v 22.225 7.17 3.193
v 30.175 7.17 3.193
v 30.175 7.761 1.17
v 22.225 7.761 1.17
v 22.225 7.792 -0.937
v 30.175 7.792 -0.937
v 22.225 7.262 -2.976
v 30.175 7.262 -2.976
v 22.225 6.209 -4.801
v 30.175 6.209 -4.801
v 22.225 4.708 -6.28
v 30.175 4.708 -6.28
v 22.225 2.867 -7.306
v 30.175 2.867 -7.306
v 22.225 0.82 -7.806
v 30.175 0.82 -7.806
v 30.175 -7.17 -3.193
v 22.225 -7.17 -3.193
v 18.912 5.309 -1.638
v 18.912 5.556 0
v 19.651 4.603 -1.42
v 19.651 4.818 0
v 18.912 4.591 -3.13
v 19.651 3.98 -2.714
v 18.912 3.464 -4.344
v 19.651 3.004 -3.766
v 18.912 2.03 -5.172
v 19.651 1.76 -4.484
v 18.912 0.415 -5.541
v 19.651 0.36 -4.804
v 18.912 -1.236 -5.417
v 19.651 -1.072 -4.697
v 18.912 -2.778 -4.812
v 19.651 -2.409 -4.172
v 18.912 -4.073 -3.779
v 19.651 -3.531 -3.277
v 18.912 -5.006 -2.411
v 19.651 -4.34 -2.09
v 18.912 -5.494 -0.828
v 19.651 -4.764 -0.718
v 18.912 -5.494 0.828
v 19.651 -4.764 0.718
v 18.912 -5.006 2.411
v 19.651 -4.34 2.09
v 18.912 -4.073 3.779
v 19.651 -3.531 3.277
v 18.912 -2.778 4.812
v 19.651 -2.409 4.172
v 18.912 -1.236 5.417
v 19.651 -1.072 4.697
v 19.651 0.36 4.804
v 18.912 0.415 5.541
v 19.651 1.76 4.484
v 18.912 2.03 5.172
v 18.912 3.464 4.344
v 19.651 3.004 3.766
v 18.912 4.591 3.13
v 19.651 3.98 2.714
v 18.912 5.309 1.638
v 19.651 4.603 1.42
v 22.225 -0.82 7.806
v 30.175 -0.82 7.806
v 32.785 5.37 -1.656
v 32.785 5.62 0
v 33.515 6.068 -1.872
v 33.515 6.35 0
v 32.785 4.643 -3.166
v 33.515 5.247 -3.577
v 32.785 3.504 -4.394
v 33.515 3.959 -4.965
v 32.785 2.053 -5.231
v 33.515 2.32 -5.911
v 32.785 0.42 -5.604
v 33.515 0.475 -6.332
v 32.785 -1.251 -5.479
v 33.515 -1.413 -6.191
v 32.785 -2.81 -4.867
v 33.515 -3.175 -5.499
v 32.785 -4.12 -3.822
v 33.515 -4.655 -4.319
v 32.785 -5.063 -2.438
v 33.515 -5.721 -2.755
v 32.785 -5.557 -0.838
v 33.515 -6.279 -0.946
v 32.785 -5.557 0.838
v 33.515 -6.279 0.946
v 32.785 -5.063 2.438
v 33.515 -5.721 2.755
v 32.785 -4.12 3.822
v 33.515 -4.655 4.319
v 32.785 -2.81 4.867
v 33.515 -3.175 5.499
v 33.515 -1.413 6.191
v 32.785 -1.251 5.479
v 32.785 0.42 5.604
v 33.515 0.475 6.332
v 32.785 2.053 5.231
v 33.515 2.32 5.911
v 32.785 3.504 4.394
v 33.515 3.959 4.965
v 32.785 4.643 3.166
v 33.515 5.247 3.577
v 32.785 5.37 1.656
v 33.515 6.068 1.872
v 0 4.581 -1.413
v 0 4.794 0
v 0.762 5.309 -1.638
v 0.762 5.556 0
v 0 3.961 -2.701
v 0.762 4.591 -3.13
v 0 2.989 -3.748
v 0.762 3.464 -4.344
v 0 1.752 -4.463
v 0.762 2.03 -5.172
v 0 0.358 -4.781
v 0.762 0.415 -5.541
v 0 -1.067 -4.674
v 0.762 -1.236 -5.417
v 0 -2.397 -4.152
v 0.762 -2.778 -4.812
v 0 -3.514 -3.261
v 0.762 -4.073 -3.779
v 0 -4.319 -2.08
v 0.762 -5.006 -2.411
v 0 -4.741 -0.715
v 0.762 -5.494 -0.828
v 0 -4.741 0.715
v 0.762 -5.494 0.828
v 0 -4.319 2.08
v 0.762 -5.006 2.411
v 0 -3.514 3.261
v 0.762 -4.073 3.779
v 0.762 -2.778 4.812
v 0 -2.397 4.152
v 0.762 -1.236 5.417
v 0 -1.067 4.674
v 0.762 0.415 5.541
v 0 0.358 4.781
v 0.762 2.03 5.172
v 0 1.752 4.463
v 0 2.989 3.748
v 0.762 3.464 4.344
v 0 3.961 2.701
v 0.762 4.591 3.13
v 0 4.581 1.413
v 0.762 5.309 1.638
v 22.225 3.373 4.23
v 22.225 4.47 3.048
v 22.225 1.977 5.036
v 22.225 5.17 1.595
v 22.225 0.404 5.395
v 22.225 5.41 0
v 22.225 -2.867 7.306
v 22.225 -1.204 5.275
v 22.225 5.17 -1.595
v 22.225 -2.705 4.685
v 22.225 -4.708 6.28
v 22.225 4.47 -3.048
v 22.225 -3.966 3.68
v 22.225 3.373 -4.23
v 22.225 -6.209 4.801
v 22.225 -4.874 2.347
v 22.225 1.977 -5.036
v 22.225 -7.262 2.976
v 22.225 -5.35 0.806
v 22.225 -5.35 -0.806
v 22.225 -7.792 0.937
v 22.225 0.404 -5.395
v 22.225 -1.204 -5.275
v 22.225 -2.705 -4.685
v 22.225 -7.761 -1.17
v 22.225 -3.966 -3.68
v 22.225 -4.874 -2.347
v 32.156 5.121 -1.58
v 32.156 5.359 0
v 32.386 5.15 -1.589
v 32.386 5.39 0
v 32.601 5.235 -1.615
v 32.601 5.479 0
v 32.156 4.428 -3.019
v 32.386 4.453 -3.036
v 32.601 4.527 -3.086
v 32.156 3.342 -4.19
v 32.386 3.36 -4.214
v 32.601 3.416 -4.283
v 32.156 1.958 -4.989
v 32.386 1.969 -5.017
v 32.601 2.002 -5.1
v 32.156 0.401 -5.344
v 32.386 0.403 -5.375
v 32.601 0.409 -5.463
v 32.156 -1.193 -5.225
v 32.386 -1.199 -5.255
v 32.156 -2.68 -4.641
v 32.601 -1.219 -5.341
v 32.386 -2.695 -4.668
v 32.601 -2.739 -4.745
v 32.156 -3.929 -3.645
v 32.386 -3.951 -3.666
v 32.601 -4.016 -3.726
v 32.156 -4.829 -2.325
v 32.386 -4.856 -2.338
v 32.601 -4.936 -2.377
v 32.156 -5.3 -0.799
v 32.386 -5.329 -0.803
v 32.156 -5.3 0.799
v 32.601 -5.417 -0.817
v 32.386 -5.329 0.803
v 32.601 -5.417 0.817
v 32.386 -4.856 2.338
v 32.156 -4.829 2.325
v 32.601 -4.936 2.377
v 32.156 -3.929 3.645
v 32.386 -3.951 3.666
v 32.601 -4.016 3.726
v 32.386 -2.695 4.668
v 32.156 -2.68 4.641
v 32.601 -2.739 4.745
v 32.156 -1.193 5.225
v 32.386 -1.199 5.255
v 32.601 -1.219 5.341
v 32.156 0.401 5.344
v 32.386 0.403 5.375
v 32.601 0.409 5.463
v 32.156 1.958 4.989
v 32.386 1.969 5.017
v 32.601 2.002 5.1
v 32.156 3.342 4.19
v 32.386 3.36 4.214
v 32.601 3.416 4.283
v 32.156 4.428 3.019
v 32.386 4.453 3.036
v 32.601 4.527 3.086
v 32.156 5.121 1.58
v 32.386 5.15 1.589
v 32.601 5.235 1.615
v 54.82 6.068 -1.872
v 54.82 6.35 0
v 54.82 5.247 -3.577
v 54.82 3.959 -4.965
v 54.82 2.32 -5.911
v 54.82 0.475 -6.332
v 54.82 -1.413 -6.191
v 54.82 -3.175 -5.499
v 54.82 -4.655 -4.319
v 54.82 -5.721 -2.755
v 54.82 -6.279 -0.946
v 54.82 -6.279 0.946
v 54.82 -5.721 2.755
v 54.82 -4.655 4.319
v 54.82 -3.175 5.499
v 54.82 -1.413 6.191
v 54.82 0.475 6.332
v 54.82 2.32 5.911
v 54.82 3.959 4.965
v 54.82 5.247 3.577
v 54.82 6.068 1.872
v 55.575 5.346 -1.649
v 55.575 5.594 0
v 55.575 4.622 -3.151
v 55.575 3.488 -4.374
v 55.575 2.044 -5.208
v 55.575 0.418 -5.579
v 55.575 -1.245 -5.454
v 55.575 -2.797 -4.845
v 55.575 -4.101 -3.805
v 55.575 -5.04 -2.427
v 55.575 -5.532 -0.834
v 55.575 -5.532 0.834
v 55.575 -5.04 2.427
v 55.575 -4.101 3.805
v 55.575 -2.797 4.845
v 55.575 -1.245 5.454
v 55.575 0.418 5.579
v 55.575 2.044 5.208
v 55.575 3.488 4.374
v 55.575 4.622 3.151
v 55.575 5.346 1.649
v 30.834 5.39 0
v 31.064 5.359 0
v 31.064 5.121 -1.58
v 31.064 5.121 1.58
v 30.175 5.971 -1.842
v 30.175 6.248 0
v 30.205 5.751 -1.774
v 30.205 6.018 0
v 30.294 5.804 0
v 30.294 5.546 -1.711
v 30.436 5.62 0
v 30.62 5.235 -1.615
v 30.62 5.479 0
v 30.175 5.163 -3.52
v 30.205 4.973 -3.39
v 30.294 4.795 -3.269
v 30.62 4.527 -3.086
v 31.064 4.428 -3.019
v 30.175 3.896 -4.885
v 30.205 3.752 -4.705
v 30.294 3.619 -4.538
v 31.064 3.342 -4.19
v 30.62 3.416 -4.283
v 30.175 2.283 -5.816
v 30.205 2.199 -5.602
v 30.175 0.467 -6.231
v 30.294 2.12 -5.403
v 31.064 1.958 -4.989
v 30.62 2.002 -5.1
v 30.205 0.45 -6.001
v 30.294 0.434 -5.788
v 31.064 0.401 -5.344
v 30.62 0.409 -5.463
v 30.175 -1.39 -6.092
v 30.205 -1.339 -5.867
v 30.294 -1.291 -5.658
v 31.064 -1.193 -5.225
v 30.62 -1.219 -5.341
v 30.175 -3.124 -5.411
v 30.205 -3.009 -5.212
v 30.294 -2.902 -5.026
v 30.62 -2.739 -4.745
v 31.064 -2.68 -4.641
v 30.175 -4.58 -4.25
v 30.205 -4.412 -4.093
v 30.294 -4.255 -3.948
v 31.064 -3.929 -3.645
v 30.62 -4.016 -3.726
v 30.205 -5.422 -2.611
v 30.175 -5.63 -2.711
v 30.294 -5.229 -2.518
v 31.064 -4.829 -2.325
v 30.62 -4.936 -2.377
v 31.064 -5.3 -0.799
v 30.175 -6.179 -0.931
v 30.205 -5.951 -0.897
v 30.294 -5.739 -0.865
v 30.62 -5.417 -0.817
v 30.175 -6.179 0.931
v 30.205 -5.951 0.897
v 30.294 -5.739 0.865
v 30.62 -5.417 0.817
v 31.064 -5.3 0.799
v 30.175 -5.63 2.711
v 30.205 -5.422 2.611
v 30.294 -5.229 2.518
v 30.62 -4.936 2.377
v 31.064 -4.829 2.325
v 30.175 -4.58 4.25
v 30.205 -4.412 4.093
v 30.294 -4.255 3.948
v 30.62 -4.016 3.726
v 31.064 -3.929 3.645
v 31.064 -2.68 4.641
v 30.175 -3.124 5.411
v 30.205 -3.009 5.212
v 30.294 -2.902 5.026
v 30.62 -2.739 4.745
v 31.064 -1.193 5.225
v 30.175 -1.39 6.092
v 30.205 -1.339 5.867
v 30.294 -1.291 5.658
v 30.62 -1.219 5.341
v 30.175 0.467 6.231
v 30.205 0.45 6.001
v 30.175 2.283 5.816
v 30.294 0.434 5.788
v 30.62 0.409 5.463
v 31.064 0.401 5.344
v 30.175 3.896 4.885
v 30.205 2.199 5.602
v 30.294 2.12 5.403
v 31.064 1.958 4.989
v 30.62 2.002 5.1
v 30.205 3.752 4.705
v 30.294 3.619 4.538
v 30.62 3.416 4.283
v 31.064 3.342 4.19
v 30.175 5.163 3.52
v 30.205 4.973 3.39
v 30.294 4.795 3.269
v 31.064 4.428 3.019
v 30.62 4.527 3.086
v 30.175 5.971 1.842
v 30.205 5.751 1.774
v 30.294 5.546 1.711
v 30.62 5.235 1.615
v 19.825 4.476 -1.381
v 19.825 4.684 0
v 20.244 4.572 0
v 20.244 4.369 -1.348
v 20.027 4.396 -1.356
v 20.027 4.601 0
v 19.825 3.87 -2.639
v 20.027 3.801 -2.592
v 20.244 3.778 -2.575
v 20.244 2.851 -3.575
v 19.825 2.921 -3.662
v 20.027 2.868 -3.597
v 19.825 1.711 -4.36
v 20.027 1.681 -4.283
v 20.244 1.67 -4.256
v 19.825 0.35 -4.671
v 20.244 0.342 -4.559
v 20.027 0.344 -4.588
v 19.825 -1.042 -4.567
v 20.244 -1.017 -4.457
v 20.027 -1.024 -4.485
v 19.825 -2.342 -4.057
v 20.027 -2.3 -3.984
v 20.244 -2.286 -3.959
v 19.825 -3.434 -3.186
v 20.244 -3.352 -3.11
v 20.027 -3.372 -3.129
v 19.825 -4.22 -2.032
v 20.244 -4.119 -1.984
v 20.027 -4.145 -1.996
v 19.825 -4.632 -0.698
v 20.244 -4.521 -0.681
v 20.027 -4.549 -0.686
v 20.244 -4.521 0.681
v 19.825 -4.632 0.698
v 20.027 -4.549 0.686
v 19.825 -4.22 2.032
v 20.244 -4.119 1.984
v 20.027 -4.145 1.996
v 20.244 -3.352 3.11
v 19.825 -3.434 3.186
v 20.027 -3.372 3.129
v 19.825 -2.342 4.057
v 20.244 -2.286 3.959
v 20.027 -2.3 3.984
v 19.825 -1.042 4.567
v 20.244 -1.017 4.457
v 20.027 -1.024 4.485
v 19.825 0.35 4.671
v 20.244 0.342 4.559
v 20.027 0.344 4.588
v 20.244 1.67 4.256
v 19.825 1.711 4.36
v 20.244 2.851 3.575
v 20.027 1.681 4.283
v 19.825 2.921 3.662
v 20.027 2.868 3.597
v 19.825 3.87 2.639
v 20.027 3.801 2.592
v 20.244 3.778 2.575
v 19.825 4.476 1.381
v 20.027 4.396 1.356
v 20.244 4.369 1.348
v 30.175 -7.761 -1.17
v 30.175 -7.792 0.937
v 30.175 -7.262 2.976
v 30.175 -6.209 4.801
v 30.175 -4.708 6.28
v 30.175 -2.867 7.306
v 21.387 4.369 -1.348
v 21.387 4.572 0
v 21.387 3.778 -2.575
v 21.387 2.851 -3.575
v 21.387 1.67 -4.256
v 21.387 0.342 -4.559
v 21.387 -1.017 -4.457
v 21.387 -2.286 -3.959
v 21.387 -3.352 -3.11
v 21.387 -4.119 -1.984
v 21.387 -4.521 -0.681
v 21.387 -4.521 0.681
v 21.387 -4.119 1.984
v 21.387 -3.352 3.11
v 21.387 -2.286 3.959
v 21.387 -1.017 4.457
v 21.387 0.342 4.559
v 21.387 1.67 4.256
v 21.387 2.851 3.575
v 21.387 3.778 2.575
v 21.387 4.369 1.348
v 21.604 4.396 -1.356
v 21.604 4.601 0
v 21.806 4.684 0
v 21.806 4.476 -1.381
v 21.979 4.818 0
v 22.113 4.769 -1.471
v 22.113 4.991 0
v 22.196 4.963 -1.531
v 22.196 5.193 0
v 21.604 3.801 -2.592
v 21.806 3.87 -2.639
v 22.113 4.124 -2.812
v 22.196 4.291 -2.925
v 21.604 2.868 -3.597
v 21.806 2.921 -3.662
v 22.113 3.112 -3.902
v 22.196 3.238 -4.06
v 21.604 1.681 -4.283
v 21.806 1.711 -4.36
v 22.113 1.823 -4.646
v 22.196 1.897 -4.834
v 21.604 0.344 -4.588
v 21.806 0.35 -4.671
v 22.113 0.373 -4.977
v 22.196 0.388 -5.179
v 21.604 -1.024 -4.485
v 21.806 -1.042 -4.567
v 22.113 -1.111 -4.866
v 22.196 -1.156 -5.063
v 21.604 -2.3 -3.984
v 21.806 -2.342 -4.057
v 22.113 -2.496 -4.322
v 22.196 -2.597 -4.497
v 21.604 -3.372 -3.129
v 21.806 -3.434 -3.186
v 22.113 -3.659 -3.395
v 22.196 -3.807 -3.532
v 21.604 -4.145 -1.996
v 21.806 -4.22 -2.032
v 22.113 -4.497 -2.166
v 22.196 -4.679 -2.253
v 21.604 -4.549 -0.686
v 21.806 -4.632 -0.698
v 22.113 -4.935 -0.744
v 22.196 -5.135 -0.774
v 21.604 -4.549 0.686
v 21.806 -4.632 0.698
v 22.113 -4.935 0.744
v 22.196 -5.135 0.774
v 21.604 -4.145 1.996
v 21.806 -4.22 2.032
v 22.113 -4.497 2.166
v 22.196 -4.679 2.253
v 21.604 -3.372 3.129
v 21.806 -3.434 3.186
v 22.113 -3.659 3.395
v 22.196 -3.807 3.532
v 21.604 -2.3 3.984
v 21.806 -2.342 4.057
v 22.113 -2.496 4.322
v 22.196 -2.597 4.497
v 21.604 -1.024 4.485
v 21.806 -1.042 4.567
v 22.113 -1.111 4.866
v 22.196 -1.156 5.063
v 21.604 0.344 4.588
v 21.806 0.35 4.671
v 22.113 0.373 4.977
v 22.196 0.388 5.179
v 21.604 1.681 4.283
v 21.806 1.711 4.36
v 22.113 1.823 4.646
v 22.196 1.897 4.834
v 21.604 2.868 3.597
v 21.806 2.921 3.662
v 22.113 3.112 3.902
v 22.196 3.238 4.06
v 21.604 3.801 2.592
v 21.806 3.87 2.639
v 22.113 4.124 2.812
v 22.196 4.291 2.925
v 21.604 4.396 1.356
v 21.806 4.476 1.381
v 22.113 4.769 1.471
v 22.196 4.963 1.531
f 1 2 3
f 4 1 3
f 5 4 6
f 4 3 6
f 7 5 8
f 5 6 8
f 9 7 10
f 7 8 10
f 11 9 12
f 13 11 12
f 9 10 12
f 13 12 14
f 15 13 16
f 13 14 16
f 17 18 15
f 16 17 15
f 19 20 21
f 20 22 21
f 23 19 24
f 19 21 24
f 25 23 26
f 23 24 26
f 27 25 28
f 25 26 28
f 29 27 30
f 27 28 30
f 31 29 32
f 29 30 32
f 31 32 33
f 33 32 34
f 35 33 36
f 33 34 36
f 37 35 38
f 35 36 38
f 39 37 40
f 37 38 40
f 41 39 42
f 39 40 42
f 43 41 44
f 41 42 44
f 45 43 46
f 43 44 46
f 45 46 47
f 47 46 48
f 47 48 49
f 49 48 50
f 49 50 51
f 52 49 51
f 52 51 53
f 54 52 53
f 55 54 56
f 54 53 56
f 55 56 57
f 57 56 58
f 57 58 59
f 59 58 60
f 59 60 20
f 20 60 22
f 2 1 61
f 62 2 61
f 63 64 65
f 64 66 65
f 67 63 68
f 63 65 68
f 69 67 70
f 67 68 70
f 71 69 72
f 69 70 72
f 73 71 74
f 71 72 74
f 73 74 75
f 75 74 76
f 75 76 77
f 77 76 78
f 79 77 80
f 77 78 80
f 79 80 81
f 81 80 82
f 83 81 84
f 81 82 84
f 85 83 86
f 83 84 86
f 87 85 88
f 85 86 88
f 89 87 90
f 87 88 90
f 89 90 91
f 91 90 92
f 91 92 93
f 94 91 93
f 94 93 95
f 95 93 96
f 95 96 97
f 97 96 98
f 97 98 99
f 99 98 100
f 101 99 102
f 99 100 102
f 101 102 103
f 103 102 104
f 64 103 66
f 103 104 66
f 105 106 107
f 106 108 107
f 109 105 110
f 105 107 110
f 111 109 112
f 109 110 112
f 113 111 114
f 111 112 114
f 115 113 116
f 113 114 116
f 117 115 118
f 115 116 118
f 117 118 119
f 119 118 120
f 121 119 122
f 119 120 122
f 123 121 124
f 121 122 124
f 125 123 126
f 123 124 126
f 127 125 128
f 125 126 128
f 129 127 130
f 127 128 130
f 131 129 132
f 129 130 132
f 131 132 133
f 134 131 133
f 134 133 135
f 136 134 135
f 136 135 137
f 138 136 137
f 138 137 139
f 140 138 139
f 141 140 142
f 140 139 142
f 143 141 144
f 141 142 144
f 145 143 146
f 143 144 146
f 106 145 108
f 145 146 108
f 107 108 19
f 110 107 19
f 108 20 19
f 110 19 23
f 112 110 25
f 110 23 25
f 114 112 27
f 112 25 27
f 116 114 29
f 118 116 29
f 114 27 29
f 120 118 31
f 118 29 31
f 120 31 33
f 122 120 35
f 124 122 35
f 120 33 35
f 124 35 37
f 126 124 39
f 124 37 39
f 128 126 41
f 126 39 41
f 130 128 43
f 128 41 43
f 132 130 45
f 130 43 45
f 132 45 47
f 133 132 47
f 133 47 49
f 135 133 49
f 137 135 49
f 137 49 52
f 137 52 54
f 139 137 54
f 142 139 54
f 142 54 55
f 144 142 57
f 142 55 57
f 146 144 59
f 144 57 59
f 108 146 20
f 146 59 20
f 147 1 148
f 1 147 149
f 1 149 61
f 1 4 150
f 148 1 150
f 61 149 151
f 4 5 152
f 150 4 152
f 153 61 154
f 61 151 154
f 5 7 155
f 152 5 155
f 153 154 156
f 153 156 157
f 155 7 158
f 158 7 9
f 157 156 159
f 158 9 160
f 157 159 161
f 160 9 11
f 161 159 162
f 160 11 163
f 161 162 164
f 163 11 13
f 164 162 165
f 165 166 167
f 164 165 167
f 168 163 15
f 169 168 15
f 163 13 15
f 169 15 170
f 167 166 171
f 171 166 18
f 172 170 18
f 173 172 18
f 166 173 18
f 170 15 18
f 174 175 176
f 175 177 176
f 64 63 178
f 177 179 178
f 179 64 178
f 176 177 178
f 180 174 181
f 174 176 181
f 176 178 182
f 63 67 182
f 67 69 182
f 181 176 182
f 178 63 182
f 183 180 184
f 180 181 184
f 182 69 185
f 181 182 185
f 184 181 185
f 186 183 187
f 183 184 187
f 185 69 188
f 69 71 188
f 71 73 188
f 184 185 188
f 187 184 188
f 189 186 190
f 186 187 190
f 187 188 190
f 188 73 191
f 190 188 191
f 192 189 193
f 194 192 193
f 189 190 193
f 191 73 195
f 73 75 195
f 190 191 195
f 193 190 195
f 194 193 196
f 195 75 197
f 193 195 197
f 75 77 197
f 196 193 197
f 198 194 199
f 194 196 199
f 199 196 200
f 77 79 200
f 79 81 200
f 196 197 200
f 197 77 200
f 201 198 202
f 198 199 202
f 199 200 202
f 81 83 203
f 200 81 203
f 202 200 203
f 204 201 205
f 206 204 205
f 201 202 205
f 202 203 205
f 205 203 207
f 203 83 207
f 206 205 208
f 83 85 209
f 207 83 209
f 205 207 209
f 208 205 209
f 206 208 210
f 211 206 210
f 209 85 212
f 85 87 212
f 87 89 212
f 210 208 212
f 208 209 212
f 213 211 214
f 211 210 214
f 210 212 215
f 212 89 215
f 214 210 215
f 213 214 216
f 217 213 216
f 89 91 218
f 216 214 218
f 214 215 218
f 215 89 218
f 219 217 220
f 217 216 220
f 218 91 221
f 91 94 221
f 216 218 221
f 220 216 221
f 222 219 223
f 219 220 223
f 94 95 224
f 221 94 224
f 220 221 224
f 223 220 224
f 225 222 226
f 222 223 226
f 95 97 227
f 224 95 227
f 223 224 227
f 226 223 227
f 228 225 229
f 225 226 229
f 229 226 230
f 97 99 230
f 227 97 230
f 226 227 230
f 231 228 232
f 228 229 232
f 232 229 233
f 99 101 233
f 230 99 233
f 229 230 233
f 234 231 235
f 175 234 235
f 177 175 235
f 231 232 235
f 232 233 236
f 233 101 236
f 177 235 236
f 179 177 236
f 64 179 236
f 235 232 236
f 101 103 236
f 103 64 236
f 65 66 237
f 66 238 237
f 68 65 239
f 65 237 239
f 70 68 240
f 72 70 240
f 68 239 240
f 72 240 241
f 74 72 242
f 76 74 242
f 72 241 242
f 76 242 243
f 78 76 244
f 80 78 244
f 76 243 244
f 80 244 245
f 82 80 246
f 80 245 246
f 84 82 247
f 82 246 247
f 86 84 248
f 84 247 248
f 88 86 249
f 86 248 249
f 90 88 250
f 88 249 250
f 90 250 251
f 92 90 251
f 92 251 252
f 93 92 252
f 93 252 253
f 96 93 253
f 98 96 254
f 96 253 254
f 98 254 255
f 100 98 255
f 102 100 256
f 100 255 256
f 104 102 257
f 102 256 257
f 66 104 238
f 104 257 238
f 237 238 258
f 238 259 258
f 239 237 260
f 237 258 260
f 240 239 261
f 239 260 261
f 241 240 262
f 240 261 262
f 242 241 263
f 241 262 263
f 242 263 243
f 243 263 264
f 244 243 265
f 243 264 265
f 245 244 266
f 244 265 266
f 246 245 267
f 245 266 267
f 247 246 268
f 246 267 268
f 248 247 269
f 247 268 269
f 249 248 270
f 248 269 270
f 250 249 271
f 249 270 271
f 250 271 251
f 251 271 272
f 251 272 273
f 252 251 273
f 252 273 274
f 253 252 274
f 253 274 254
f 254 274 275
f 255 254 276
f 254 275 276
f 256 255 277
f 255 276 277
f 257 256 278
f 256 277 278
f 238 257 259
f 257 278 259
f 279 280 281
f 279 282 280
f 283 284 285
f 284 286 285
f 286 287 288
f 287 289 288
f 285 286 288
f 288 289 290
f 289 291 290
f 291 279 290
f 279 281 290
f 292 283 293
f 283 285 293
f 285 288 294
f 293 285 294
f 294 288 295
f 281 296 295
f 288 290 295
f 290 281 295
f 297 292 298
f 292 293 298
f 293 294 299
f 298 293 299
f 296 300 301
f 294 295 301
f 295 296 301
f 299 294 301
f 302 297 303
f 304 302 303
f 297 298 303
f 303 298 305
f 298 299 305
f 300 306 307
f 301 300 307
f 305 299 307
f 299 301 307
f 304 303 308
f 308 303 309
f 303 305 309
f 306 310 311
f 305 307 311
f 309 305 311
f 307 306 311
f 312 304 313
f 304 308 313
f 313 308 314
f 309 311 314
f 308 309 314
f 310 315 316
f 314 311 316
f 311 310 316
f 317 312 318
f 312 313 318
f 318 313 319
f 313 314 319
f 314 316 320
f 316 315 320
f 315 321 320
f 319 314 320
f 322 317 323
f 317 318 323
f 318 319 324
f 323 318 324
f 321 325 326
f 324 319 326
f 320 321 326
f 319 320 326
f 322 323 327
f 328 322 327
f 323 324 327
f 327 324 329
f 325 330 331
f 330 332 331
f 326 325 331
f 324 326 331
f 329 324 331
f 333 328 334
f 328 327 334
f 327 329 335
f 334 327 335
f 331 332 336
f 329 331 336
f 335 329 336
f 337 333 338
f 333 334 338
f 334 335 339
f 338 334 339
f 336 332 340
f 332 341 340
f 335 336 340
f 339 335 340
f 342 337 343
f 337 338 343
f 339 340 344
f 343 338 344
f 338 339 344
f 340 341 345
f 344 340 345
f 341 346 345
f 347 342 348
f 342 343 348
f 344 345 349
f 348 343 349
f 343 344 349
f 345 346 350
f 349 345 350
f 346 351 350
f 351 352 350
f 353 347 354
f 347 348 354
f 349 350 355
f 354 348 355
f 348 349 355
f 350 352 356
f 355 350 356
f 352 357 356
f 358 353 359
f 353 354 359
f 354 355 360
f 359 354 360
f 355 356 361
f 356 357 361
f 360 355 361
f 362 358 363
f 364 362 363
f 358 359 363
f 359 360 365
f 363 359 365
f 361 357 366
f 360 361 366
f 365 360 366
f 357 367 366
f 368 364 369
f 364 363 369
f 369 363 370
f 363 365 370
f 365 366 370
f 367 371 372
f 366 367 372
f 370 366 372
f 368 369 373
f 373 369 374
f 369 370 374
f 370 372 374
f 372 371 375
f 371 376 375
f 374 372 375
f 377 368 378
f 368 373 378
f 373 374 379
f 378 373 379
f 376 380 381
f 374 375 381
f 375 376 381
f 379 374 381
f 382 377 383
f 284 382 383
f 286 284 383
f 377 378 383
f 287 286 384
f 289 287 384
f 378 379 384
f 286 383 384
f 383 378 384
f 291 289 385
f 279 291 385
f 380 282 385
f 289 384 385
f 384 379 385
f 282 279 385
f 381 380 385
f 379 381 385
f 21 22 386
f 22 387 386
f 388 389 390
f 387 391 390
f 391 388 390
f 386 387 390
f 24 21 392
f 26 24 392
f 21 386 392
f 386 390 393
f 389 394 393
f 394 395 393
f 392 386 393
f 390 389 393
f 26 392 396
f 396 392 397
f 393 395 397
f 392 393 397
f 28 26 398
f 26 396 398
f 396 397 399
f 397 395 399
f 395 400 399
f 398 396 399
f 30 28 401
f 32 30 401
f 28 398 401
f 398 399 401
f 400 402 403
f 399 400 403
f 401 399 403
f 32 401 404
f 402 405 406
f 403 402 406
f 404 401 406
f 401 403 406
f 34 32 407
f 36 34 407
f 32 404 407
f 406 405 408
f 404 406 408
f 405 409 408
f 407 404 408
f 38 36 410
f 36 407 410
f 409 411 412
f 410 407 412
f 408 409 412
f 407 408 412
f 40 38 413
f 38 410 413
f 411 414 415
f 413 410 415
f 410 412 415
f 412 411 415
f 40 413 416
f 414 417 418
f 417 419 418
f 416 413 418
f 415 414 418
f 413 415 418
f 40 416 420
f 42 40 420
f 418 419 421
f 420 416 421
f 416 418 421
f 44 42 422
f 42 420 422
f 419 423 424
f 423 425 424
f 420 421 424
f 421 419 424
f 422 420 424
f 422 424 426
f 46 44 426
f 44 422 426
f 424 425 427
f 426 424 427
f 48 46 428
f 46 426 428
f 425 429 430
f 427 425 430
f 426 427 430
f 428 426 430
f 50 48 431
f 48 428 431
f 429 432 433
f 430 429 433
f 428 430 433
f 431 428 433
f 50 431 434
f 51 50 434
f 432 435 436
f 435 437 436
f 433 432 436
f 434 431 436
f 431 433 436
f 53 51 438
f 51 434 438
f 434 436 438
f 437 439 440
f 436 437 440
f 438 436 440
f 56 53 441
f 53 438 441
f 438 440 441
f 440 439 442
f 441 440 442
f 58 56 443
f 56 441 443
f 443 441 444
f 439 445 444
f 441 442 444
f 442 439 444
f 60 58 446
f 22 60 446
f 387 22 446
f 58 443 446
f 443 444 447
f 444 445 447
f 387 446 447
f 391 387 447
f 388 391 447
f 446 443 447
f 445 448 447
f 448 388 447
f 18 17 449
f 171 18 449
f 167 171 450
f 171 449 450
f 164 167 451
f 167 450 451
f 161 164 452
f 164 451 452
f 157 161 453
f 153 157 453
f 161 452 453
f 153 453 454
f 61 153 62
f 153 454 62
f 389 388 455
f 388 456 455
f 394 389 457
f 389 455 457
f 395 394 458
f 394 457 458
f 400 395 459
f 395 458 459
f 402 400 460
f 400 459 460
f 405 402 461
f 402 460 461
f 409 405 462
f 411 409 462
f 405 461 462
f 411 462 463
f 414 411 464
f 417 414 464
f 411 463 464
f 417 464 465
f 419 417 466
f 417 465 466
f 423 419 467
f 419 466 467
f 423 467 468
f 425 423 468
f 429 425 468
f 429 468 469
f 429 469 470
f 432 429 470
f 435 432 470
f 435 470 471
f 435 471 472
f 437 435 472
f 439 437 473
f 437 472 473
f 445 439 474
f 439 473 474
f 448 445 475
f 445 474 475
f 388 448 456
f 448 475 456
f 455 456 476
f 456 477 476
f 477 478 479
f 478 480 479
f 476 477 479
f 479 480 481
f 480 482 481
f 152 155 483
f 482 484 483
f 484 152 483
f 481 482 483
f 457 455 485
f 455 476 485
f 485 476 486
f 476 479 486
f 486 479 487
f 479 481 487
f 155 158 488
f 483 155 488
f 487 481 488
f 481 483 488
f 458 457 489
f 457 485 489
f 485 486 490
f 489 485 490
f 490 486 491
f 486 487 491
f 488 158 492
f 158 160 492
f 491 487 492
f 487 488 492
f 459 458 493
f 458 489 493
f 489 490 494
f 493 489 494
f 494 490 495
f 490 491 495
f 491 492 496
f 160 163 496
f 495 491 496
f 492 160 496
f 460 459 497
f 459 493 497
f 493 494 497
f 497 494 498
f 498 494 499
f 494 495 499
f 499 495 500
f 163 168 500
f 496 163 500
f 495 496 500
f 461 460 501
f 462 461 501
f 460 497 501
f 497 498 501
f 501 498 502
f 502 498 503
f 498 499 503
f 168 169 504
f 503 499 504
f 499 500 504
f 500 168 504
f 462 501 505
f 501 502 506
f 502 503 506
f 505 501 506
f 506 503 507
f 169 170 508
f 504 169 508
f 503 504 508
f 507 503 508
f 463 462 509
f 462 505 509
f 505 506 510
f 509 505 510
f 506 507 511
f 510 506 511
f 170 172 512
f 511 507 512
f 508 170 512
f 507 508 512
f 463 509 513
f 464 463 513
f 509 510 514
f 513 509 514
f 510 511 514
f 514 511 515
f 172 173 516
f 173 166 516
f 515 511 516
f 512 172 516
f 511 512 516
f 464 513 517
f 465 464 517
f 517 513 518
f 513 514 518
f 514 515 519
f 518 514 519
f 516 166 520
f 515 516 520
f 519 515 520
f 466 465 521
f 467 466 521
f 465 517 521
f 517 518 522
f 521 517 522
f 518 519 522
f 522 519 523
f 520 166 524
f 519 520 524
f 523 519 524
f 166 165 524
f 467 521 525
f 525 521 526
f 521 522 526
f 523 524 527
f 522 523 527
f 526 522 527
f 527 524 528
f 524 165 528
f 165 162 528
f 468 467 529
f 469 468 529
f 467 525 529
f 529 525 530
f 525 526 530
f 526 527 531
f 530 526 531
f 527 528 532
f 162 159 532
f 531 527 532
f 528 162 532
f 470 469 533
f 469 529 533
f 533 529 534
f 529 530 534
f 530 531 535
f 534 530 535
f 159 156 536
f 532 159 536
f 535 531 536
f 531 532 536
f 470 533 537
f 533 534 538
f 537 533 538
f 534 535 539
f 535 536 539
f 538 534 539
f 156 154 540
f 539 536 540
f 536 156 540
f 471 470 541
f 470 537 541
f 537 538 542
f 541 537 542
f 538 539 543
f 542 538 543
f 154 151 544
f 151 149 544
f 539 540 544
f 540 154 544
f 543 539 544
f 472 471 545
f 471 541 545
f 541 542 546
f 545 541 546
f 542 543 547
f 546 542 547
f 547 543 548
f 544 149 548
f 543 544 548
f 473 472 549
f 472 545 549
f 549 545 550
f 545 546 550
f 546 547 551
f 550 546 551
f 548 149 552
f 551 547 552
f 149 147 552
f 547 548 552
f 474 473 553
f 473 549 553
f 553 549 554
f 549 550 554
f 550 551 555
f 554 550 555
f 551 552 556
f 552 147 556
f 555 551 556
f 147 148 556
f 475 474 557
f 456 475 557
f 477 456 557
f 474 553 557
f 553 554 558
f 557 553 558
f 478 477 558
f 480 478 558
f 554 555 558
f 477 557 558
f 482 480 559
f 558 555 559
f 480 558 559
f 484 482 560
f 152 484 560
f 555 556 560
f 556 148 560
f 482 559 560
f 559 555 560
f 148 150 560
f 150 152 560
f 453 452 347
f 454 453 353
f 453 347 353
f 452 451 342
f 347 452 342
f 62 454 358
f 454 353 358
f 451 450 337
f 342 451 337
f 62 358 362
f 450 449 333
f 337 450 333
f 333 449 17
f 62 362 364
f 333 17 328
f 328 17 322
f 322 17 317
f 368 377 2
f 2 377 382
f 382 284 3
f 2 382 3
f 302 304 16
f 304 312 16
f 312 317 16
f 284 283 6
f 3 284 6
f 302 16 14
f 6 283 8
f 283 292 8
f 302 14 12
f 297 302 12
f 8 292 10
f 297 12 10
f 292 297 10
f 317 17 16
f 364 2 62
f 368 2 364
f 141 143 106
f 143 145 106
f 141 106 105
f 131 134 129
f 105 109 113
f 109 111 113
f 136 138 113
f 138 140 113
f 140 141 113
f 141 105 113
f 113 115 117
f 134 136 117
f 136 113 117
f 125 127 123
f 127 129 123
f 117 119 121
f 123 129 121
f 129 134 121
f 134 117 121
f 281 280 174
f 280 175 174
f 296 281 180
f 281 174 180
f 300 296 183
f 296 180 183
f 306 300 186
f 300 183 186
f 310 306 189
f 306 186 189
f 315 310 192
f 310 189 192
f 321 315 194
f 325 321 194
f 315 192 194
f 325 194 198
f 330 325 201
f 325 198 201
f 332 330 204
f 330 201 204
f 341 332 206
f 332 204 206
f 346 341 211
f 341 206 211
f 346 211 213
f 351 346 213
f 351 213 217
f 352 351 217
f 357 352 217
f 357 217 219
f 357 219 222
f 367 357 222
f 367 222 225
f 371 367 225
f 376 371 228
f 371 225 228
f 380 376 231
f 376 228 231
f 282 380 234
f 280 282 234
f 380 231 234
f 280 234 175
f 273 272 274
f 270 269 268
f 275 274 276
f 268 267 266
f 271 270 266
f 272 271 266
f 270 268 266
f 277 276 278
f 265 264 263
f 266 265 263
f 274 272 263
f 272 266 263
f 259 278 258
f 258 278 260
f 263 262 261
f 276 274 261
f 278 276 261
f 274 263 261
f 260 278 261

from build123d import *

# Parameters (mm, degrees)
CUT_EXTRUDE1_DEPTH = 31.4452


with BuildPart() as part:
    # Sketch1 → Revolve1 (revolve)
    with BuildSketch(Plane.XY):
        with BuildLine():
            Line((0, 0), (0, 4.79425))
            Line((0, 4.79425), (0.762, 5.55625))
            Line((0.762, 5.55625), (18.912356192, 5.55625))
            Line((18.912356192, 5.55625), (19.651103096, 4.817503096))
            ThreePointArc((19.651103096, 4.817503096), (19.923034747, 4.635804176), (20.2438, 4.572))
            Line((20.2438, 4.572), (21.3868, 4.572))
            ThreePointArc((21.3868, 4.572), (21.979496904, 4.817503096), (22.225, 5.4102))
            Line((22.225, 5.4102), (22.225, 7.8486))
            Line((22.225, 7.8486), (30.1752, 7.8486))
            Line((30.1752, 7.8486), (30.1752, 0))
            Line((30.1752, 0), (0, 0))
        make_face()
    revolve(axis=Axis((30.1752, 0, 0), (-1, 0, 0)))

    # Sketch3 → Revolve2 (revolve)
    with BuildSketch(Plane.XY):
        with BuildLine():
            Line((30.1752, 0), (30.1752, 6.2484))
            ThreePointArc((30.1752, 6.2484), (30.435582072, 5.619782072), (31.0642, 5.3594))
            Line((31.0642, 5.3594), (32.1564, 5.3594))
            ThreePointArc((32.1564, 5.3594), (32.496605571, 5.427071096), (32.785017928, 5.619782072))
            Line((32.785017928, 5.619782072), (33.515235857, 6.35))
            Line((33.515235857, 6.35), (54.81955, 6.35))
            Line((54.81955, 6.35), (55.5752, 5.59435))
            Line((55.5752, 5.59435), (55.5752, 0))
            Line((55.5752, 0), (30.1752, 0))
        make_face()
    revolve(axis=Axis((55.5752, 0, 0), (-1, 0, 0)))

    # Sketch2 → Cut-Extrude1 (cut)
    with BuildSketch(Plane(origin=(0, 0, 0), x_dir=(0, 0, -1), z_dir=(1, 0, 0))):
        Polygon((-21.859138511, -5.857138511), (5.857138511, -21.859138511), (21.859138511, 5.857138511), (-5.857138511, 21.859138511), align=None)
        with BuildLine():
            Line((2.227168484, -8.842431029), (8.771354144, 2.492431029))
            ThreePointArc((8.771354144, 2.492431029), (4.5593, 7.896939247), (-2.227168484, 8.842431029))
            Line((-2.227168484, 8.842431029), (-8.771354144, -2.492431029))
            ThreePointArc((-8.771354144, -2.492431029), (-4.5593, -7.896939247), (2.227168484, -8.842431029))
        make_face(mode=Mode.SUBTRACT)
    extrude(amount=CUT_EXTRUDE1_DEPTH, mode=Mode.SUBTRACT)


solid = part.part
